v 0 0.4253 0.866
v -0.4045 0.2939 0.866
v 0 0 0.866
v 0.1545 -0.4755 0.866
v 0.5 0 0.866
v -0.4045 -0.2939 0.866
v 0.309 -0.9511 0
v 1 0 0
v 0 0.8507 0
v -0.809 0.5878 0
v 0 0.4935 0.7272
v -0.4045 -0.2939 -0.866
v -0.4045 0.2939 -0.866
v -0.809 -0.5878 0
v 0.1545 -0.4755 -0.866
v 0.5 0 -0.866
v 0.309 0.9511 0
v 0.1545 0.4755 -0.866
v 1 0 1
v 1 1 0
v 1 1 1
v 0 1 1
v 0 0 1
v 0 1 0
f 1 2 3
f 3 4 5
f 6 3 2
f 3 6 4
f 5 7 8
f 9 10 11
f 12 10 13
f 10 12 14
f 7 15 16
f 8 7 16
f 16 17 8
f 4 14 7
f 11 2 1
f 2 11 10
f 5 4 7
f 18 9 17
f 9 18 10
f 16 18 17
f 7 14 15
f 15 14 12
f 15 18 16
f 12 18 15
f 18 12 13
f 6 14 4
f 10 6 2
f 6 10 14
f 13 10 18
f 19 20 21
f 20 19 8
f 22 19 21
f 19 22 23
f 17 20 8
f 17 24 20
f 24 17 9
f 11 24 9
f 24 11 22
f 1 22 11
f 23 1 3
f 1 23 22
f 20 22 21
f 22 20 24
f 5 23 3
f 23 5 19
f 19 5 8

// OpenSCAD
module m(a) children(a);
m([0:20000]) { cube(); sphere(); }
m([0:0:1]) { cube(); sphere(); }
m([1:0:1]) { cube(); sphere(); }
m([0:1/0:1]) { cube(); sphere(); }
m([1:-1:0]) { cube(); sphere(); }
m([0:0.5:1]) { cube(); sphere(); }
m([-1:1]) { cube(); sphere(); }
m(1.7) { cube(); sphere(); }
m(-0.5) { cube(); sphere(); }
m(1/0) { cube(); sphere(); }
m(2) { cube(); sphere(); }
m("a") { cube(); sphere(); }
m(undef) { cube(); sphere(); }
m([0,"a",1]) { cube(); sphere(); }
m([[0]]) { cube(); sphere(); }
m([0:1:4294967298]) { cube(); sphere(); }
module two() children(0, 1); two() { cube(); sphere(); }
module named() children(index = 1); named() { cube(); sphere(); }
module none() children([0:$children-1]); none();
